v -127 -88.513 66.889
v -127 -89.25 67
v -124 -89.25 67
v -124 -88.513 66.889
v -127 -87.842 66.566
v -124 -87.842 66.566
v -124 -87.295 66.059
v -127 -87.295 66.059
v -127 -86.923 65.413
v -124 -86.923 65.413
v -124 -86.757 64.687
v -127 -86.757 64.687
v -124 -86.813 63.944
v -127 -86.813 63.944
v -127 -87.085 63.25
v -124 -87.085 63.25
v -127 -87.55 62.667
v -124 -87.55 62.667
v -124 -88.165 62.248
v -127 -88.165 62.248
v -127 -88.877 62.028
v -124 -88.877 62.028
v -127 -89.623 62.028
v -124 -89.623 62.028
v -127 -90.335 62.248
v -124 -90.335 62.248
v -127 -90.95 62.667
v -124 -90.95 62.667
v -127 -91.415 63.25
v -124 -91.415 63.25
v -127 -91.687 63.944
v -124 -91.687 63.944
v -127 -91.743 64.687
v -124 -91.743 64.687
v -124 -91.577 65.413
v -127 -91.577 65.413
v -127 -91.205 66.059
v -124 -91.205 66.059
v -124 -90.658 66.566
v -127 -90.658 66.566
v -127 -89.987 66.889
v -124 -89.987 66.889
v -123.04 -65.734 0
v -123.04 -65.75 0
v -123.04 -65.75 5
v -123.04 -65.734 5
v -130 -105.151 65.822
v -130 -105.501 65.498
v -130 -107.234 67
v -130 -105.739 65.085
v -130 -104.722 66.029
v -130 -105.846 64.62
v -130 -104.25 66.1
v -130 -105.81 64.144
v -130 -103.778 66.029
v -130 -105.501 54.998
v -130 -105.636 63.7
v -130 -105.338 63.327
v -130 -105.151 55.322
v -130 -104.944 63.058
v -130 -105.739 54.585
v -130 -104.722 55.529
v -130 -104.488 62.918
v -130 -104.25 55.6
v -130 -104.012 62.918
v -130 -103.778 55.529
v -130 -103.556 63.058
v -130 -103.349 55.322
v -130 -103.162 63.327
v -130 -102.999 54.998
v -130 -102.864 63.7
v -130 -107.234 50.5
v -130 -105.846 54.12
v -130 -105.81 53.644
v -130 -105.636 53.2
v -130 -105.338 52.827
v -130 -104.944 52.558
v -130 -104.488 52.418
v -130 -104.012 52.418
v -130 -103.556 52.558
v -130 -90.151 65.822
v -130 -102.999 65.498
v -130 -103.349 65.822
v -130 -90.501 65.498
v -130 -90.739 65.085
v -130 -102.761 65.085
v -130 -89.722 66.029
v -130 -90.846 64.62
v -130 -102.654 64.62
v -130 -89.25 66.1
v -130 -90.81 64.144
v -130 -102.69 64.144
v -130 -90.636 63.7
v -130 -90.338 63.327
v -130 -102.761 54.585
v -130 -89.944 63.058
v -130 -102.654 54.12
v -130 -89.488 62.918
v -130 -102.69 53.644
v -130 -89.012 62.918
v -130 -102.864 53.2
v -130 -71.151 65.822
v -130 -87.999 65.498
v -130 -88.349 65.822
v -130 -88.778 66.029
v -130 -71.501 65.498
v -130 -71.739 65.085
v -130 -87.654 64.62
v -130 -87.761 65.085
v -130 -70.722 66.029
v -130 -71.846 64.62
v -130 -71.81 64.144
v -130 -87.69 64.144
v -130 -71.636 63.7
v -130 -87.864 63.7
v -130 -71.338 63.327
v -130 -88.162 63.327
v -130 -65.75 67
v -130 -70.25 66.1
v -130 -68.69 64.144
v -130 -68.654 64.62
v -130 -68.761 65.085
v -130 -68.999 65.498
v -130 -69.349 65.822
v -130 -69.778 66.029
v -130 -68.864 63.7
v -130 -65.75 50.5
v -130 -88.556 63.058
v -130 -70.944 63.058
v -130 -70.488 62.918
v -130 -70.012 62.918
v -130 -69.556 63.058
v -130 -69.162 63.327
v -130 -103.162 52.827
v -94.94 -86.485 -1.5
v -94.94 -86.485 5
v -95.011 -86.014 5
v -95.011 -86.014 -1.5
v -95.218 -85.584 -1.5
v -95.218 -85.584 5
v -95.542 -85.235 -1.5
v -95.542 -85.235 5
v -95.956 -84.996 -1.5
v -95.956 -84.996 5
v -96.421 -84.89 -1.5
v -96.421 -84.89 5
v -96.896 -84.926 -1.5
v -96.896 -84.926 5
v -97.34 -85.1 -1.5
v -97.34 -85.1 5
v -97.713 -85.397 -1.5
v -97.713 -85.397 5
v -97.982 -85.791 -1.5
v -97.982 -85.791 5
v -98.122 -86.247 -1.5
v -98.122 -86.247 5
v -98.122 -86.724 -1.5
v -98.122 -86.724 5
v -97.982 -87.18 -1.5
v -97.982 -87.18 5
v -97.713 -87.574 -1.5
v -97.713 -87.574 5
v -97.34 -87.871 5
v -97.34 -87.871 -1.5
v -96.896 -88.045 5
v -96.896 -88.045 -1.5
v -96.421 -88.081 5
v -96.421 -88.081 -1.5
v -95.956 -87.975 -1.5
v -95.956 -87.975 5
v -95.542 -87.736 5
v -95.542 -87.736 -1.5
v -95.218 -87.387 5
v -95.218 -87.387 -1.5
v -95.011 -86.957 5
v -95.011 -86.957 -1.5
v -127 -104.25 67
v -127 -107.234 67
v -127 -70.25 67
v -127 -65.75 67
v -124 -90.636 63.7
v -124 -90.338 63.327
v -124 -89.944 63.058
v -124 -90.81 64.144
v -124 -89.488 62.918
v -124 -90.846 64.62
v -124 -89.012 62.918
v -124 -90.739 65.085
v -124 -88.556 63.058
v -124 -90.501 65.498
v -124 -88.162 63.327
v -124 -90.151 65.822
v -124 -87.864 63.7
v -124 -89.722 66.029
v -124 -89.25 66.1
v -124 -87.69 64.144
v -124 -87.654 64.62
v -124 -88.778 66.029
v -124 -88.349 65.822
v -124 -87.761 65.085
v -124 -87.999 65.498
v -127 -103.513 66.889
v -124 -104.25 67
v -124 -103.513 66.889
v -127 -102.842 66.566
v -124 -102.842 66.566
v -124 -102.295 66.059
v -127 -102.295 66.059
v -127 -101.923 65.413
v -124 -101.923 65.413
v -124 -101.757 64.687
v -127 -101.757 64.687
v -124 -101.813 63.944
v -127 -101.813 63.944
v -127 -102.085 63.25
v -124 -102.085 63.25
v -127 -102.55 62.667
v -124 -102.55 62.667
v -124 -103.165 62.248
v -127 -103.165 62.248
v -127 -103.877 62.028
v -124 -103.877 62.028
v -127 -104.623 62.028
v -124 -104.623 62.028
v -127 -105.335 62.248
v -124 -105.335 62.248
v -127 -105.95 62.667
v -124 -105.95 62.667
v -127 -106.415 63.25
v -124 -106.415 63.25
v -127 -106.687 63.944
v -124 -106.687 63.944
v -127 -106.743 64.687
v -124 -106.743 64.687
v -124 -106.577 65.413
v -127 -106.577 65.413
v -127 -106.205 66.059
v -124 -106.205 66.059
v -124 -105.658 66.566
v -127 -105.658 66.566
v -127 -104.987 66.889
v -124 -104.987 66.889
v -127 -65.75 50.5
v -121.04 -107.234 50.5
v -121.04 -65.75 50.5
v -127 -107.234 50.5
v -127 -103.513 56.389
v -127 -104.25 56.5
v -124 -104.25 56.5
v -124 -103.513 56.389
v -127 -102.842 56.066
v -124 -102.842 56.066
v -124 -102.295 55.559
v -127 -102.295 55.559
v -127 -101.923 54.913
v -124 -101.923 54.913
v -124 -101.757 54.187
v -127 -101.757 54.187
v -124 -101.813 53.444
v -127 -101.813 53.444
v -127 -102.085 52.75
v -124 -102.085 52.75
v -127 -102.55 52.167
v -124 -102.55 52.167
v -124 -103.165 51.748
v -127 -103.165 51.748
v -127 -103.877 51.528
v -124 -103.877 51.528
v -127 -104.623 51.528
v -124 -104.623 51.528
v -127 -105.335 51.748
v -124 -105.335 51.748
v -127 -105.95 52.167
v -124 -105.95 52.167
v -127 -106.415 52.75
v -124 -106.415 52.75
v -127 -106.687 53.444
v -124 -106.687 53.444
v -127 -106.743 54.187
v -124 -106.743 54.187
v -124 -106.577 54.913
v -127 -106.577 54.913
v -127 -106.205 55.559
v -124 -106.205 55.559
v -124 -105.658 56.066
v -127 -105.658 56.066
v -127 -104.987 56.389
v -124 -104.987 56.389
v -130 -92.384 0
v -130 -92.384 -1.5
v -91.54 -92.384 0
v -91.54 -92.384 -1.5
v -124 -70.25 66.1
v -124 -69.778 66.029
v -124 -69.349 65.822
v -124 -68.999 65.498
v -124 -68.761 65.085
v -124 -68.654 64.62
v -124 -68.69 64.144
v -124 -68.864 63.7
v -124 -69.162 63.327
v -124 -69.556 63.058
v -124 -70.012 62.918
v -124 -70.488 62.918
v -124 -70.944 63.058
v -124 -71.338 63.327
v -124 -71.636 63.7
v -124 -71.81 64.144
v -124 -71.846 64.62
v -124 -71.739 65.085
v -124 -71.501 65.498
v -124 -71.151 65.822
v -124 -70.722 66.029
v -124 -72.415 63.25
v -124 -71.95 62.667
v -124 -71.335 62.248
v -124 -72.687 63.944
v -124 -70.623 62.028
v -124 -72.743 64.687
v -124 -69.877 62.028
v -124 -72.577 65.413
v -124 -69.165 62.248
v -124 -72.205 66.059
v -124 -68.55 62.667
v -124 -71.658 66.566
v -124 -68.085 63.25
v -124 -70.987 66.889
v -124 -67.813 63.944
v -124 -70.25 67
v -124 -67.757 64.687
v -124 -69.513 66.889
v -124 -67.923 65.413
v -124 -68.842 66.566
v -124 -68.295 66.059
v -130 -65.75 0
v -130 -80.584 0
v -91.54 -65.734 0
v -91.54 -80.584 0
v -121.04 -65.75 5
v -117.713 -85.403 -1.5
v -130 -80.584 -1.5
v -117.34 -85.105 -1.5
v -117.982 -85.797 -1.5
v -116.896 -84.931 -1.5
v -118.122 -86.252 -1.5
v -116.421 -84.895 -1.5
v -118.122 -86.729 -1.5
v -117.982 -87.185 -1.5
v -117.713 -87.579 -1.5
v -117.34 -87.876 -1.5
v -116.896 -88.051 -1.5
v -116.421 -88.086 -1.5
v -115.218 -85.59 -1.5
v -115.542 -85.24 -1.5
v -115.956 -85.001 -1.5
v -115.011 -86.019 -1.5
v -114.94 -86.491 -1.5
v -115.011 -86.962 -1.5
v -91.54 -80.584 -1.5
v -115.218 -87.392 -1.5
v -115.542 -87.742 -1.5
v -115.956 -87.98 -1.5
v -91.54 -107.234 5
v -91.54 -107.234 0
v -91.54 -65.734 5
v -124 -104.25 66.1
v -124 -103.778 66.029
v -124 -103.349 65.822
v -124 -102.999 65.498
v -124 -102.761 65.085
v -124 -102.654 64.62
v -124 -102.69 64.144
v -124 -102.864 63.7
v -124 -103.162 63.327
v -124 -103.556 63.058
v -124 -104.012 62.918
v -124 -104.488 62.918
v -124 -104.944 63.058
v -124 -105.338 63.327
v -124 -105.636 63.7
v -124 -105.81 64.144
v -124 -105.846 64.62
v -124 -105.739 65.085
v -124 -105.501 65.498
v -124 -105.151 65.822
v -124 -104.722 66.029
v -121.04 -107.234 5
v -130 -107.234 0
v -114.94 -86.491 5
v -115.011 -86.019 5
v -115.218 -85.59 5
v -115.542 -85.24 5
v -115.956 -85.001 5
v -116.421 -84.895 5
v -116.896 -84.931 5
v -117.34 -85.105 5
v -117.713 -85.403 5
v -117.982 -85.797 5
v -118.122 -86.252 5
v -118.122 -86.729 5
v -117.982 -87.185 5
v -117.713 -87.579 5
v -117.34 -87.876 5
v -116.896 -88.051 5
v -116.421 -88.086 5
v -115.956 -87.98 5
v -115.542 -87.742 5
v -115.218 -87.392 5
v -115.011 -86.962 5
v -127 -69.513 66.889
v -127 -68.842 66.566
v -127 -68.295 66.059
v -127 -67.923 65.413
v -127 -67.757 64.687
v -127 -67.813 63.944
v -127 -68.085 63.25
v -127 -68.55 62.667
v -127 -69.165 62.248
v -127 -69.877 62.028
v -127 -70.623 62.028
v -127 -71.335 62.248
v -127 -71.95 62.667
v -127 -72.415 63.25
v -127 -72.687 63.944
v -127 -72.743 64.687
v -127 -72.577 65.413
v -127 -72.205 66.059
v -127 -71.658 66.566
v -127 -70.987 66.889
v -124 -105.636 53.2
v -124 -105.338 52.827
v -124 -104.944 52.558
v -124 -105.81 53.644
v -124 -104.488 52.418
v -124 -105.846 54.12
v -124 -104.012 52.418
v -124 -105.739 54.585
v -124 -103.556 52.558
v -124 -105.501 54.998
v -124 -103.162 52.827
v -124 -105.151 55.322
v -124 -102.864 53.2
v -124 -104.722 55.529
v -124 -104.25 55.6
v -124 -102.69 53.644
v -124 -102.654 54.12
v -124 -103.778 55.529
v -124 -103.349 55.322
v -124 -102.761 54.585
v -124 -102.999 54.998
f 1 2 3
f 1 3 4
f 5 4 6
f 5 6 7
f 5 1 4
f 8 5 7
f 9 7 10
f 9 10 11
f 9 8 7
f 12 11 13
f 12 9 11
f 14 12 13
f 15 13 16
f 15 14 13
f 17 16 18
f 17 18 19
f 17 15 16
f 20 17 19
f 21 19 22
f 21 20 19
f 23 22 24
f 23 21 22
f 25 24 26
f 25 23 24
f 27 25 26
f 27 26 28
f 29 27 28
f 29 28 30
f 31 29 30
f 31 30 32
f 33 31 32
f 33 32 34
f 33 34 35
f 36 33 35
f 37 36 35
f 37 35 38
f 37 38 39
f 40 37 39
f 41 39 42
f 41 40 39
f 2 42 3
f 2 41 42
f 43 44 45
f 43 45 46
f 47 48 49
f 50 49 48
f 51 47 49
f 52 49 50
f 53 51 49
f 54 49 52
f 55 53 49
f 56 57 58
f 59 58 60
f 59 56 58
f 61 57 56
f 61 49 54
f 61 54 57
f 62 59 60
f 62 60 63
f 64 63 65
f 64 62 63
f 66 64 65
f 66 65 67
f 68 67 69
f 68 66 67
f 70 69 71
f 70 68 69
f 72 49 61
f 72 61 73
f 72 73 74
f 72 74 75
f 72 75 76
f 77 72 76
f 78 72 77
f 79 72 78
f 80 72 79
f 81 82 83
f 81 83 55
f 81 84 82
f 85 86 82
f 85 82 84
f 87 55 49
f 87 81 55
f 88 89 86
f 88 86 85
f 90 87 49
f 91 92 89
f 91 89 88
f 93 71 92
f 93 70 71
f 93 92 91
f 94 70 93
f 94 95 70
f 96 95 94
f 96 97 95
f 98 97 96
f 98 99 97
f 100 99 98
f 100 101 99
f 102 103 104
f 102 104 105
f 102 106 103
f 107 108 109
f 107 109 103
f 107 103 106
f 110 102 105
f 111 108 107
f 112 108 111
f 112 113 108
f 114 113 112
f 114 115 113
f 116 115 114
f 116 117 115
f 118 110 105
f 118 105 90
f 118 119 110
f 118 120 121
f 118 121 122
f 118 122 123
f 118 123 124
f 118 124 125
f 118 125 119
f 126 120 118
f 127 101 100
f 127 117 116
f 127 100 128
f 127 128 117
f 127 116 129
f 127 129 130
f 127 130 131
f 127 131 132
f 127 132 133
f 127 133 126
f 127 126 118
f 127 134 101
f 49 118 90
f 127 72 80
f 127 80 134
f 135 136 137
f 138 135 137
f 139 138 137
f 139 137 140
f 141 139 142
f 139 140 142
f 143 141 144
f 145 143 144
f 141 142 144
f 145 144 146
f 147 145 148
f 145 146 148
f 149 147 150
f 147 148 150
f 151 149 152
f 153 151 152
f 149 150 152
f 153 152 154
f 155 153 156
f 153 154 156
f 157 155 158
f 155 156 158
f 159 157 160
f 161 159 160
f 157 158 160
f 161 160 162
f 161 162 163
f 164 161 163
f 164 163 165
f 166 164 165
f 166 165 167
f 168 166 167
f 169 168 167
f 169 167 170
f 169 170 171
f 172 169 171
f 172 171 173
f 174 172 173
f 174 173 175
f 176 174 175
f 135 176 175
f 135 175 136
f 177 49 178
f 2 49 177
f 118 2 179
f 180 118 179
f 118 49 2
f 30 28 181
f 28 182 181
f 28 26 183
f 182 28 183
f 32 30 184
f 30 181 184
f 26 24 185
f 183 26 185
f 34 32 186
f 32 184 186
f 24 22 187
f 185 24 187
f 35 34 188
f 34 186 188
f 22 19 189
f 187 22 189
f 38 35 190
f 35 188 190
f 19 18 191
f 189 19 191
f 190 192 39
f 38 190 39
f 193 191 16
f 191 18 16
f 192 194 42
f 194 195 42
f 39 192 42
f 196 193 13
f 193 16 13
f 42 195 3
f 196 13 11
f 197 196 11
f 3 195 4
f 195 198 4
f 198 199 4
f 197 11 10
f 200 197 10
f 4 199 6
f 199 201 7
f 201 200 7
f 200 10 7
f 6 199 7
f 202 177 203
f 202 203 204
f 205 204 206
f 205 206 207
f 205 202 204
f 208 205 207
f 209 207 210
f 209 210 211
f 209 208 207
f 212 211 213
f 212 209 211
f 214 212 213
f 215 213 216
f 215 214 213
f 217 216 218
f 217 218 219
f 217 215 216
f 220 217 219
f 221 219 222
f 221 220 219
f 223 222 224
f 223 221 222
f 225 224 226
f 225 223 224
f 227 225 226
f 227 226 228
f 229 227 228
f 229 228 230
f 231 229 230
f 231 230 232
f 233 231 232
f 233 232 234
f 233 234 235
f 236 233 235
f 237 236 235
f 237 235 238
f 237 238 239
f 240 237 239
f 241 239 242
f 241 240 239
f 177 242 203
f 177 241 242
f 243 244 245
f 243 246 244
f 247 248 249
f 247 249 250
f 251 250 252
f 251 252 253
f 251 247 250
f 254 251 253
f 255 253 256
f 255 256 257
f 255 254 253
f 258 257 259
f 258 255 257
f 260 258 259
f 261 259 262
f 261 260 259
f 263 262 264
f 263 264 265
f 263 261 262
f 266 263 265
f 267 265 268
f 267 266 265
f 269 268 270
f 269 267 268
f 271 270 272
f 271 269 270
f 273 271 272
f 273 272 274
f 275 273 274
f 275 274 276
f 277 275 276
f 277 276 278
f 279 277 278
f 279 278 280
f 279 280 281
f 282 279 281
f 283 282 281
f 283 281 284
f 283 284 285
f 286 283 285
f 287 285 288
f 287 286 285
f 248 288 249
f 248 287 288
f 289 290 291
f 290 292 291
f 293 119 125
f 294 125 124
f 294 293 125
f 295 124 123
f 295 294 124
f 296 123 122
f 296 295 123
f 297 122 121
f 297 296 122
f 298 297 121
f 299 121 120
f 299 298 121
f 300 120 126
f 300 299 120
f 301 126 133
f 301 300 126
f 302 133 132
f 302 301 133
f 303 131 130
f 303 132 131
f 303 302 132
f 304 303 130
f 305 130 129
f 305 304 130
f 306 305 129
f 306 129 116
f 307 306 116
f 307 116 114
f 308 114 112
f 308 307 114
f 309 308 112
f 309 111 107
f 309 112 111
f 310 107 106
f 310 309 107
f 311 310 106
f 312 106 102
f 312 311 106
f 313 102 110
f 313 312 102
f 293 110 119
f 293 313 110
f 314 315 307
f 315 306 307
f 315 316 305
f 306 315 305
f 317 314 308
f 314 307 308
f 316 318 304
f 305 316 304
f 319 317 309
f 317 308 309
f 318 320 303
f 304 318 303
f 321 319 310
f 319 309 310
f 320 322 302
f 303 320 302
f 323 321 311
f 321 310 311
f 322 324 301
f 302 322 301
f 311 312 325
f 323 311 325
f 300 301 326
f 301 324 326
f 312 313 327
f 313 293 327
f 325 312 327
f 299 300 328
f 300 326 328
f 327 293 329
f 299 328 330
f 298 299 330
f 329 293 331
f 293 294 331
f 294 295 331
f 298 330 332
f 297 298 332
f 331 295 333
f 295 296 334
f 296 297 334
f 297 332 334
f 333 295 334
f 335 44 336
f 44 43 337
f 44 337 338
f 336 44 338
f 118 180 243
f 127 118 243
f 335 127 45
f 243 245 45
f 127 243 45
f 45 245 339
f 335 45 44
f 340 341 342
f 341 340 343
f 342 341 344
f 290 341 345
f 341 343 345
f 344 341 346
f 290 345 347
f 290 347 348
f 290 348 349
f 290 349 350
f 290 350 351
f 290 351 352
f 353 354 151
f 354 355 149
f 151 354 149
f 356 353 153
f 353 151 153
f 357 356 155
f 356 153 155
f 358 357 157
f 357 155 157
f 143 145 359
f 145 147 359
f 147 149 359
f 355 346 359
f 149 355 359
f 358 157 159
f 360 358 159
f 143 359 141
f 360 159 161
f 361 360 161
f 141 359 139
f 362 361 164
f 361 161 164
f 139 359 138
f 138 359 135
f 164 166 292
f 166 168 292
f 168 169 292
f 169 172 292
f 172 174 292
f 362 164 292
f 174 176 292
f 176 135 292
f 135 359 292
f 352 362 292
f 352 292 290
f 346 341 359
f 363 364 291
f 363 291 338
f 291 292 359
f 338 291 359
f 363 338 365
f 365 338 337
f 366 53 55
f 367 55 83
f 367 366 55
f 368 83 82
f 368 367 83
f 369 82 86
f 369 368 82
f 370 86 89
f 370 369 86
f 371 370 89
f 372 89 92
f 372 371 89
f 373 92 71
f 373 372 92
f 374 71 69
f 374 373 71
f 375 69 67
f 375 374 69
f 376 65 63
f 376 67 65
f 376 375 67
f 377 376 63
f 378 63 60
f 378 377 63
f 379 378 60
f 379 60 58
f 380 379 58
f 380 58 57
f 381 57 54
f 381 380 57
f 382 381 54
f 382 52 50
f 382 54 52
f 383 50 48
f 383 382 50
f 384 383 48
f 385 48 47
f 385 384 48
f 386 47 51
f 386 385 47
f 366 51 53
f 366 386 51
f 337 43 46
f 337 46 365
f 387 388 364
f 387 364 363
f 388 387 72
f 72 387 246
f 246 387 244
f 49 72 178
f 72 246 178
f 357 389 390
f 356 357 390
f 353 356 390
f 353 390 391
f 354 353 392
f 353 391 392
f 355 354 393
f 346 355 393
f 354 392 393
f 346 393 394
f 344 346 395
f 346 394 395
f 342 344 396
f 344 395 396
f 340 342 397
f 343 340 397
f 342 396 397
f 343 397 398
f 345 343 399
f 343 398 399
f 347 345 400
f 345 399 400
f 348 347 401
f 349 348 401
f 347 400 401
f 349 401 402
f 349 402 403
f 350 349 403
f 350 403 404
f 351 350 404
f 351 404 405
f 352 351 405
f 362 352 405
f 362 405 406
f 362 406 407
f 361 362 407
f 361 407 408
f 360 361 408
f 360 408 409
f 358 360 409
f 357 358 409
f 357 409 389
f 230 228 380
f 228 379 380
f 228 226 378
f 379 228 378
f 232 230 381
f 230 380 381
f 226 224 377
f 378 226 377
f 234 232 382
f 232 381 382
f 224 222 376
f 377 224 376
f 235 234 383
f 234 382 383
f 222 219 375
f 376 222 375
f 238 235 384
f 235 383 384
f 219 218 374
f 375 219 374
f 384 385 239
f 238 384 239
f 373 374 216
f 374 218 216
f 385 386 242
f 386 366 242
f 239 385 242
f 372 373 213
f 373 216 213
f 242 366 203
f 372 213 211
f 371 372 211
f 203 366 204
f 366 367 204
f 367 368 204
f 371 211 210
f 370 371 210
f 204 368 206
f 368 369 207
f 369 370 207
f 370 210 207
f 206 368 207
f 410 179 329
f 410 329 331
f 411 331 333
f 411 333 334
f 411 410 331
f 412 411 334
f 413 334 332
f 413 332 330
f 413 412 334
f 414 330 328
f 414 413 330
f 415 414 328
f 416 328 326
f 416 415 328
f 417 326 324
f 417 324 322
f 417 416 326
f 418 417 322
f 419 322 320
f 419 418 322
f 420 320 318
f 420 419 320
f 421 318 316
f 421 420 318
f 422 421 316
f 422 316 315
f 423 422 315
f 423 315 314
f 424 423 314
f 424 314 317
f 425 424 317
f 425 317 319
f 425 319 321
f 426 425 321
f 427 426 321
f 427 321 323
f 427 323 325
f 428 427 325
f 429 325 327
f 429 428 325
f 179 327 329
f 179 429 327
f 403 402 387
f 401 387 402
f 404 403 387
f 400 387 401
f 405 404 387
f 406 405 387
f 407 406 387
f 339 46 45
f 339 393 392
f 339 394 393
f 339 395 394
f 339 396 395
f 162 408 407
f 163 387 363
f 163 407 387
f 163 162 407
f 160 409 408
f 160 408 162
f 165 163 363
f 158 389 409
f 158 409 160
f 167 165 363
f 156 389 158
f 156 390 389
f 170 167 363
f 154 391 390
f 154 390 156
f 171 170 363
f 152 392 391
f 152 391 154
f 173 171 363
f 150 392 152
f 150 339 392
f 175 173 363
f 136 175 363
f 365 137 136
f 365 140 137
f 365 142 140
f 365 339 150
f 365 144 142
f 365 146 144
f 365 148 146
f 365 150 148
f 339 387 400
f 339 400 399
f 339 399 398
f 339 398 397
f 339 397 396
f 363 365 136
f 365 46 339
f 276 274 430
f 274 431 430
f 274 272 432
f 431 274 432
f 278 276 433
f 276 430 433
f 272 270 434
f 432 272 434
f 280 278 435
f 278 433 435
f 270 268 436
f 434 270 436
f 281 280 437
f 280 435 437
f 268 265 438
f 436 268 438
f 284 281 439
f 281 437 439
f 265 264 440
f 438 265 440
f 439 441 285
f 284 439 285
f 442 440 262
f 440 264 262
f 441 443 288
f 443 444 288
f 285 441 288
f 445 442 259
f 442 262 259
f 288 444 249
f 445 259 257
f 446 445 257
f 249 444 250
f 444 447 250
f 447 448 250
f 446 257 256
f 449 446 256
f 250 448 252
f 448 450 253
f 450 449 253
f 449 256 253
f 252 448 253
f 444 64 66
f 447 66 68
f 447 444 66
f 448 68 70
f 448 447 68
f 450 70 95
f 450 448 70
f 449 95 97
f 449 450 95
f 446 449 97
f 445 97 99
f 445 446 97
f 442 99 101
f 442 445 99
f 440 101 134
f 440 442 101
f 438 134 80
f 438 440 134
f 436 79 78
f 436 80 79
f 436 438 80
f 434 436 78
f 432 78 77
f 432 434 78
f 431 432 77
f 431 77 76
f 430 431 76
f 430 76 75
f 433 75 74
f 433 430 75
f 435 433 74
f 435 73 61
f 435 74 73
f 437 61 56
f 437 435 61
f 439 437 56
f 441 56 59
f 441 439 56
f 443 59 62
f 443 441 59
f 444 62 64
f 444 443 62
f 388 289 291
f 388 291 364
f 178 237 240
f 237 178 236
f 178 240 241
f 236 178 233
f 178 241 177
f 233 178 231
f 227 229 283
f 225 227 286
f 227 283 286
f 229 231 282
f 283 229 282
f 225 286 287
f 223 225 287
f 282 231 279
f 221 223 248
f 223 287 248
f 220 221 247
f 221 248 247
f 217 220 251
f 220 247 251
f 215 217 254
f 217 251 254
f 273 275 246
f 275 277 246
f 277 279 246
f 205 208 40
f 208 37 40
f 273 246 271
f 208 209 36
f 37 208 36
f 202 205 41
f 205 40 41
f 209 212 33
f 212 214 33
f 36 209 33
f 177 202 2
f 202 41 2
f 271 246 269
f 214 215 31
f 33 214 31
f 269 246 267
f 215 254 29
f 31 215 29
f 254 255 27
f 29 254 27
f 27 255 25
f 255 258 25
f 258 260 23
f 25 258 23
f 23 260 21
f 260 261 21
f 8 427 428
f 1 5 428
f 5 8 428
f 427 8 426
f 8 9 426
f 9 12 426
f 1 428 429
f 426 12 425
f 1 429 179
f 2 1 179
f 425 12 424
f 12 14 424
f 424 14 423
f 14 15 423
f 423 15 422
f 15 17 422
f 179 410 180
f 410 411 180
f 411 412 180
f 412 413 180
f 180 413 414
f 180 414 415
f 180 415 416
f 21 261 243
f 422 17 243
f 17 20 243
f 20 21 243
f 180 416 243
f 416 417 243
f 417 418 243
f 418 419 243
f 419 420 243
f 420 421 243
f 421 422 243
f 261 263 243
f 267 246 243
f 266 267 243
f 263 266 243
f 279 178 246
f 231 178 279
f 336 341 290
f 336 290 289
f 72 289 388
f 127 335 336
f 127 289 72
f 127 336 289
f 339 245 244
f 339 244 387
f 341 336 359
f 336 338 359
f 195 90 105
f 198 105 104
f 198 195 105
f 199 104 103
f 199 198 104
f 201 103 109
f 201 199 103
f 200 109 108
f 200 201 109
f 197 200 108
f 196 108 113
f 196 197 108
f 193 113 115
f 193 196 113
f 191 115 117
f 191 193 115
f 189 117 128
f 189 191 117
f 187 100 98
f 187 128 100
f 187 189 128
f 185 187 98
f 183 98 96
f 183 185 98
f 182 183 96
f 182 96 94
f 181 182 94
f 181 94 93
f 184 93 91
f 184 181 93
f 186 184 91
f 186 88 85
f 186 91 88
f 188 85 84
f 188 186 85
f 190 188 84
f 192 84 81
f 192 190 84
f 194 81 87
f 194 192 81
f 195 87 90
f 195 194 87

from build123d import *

# Parameters (mm, degrees)
SKETCH1_W               = 31.5
SKETCH1_H               = 41.5
BOSS_EXTRUDE1_DEPTH     = 5
SKETCH3_W               = 6
SKETCH3_H               = 41.48411863
BOSS_EXTRUDE3_DEPTH     = 50.5
SKETCH5_W               = 3
SKETCH5_H               = 41.48411863
BOSS_EXTRUDE4_DEPTH     = 16.5
SKETCH6_W               = 50.5
SKETCH6_H               = 41.48411863
BOSS_EXTRUDE6_DEPTH     = 2
SKETCH4_R               = 2.5
SKETCH4_R_2             = 1.6
BOSS_EXTRUDE7_DEPTH     = 3
SKETCH4_6_R             = 1.6
CUT_EXTRUDE1_DEPTH      = 4
CUT_EXTRUDE1_DEPTH_BACK = 36.459931403
SKETCH7_W               = 1.5
SKETCH7_H               = 11.8
BOSS_EXTRUDE8_DEPTH     = 37.5
SKETCH8_R               = 1.6
CUT_EXTRUDE2_DEPTH      = 7.5
BOSS_EXTRUDE9_DEPTH     = 0.959931


with BuildPart() as part:
    # Sketch1 → Boss-Extrude1 (new body)
    with BuildSketch(Plane.XY):
        with Locations((-107.290068597, -86.48411863)):
            Rectangle(SKETCH1_W, SKETCH1_H)
    extrude(amount=BOSS_EXTRUDE1_DEPTH)

    # Sketch3 → Boss-Extrude3 (add)
    with BuildSketch(Plane.XY):
        with Locations((-126.040068597, -86.492059315)):
            Rectangle(SKETCH3_W, SKETCH3_H)
    extrude(amount=BOSS_EXTRUDE3_DEPTH)

    # Sketch5 → Boss-Extrude4 (add)
    with BuildSketch(Plane.XY.offset(50.5)):
        with Locations((-128.5, -86.492059315)):
            Rectangle(SKETCH5_W, SKETCH5_H)
    extrude(amount=BOSS_EXTRUDE4_DEPTH)

    # Sketch6 → Boss-Extrude6 (add)
    with BuildSketch(Plane(origin=(-123.040068597, 0, 0), x_dir=(0, 0, -1), z_dir=(1, 0, 0))):
        with Locations((-25.25, -86.492059315)):
            Rectangle(SKETCH6_W, SKETCH6_H)
    extrude(amount=BOSS_EXTRUDE6_DEPTH)

    # Sketch4 → Boss-Extrude7 (add)
    with BuildSketch(Plane.ZY.offset(127)):
        with Locations((54, -104.25)):
            Circle(SKETCH4_R)
        with Locations((54, -104.25)):
            Circle(SKETCH4_R_2, mode=Mode.SUBTRACT)
        with Locations((64.5, -104.25)):
            Circle(SKETCH4_R)
        with Locations((64.5, -104.25)):
            Circle(SKETCH4_R_2, mode=Mode.SUBTRACT)
        with Locations((64.5, -89.25)):
            Circle(SKETCH4_R)
        with Locations((64.5, -89.25)):
            Circle(SKETCH4_R_2, mode=Mode.SUBTRACT)
        with Locations((64.5, -70.25)):
            Circle(SKETCH4_R)
        with Locations((64.5, -70.25)):
            Circle(SKETCH4_R_2, mode=Mode.SUBTRACT)
    extrude(amount=-BOSS_EXTRUDE7_DEPTH)

    # Sketch4<6> → Cut-Extrude1 (cut, two sides)
    with BuildSketch(Plane.ZY.offset(127)) as cut_extrude1_sk:
        with Locations((64.5, -104.25)):
            Circle(SKETCH4_6_R)
        with Locations((64.5, -89.25)):
            Circle(SKETCH4_6_R)
        with Locations((64.5, -70.25)):
            Circle(SKETCH4_6_R)
        with Locations((54, -104.25)):
            Circle(SKETCH4_6_R)
    extrude(amount=CUT_EXTRUDE1_DEPTH, mode=Mode.SUBTRACT)
    extrude(cut_extrude1_sk.sketch, amount=-CUT_EXTRUDE1_DEPTH_BACK, mode=Mode.SUBTRACT)

    # Sketch7 → Boss-Extrude8 (add)
    with BuildSketch(Plane(origin=(-91.540068597, 0, 0), x_dir=(0, 0, -1), z_dir=(1, 0, 0))):
        with Locations((0.75, -86.48411863)):
            Rectangle(SKETCH7_W, SKETCH7_H)
    extrude(amount=-BOSS_EXTRUDE8_DEPTH)

    # Sketch8 → Cut-Extrude2 (cut, through all)
    with BuildSketch(Plane.XY.offset(5)):
        with Locations((-116.540068597, -86.490848024)):
            Circle(SKETCH8_R)
        with Locations((-96.540068597, -86.485464509)):
            Circle(SKETCH8_R)
    extrude(amount=-CUT_EXTRUDE2_DEPTH, mode=Mode.SUBTRACT)

    # Sketch9 → Boss-Extrude9 (add)
    with BuildSketch(Plane.ZY.offset(129.040068597)):
        Polygon((50.5, -65.75), (0, -65.75), (0, -80.58411863), (-1.5, -80.58411863), (-1.5, -92.38411863), (0, -92.38411863), (0, -107.23411863), (50.5, -107.23411863), align=None)
    extrude(amount=BOSS_EXTRUDE9_DEPTH)


solid = part.part
